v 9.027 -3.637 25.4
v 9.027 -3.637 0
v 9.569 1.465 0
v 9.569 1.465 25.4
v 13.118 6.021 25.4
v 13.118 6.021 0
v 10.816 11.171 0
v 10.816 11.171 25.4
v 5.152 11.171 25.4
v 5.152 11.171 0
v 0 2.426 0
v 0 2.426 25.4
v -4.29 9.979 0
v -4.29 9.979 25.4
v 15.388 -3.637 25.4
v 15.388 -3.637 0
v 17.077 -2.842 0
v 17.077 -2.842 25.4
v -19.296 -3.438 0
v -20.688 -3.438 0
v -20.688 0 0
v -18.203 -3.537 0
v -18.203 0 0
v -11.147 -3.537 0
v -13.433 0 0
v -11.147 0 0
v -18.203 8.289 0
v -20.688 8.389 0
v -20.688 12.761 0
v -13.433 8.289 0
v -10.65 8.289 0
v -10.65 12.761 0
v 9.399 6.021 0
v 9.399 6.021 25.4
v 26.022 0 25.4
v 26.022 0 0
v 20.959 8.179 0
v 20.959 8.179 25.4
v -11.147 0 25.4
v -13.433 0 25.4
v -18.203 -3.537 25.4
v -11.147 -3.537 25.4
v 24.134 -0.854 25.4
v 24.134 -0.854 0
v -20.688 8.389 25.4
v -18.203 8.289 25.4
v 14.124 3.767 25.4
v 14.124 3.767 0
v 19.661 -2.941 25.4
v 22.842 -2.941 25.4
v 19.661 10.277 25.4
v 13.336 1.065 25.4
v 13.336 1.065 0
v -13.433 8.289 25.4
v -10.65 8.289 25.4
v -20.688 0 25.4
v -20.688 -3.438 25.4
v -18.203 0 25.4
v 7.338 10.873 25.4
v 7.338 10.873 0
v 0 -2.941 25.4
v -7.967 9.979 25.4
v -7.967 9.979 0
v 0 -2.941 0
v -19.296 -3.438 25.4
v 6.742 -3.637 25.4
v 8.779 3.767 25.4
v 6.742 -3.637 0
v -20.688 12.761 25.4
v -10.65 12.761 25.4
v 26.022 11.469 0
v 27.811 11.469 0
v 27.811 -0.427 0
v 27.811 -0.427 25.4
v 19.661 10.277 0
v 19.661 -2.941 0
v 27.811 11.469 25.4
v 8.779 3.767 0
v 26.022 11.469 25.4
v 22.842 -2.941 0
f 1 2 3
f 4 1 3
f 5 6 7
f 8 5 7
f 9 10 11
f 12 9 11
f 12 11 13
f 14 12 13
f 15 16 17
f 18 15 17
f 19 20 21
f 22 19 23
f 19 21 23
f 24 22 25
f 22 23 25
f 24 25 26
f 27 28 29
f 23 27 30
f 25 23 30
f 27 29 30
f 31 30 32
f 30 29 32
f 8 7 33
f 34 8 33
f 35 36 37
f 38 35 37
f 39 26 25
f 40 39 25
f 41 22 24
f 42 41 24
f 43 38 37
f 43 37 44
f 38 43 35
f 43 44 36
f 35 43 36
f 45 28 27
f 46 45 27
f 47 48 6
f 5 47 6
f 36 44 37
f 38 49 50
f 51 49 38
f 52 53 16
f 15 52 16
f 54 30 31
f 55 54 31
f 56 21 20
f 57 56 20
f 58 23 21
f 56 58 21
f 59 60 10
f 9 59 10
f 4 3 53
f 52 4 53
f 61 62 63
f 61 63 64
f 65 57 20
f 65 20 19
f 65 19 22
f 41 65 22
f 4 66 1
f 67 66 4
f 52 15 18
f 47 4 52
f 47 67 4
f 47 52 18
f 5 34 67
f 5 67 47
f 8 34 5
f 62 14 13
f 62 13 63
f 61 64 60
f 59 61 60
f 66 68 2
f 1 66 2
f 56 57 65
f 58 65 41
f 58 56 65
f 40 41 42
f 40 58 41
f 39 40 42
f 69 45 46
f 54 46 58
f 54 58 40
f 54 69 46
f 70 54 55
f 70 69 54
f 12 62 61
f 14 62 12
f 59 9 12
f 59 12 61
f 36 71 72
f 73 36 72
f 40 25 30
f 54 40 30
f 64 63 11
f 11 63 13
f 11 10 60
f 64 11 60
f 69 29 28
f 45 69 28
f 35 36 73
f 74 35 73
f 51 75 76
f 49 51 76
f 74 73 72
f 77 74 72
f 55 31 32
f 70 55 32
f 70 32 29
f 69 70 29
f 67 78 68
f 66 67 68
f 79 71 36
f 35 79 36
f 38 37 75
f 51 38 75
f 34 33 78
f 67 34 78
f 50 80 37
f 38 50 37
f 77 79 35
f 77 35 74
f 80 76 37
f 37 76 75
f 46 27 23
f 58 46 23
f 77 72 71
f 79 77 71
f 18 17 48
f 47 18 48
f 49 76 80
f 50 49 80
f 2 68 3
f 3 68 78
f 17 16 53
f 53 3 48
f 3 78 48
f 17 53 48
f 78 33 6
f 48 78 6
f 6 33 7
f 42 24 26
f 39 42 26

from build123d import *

# Parameters (mm, degrees)
F1_DEPTH = 25.4


with BuildPart() as f1:
    # F0 (on Top) → F1 (new body)
    with BuildSketch(Plane.XY):
        Polygon((-4.289746, 9.978659), (-7.966883, 9.978659), (0, -2.941008), (7.337954, 10.873098), (5.151548, 11.171243), (0, 2.425623), align=None)
        Polygon((14.12448, 3.76728), (8.778994, 3.76728), (6.741662, -3.636682), (9.027448, -3.636682), (9.568511, 1.464764), (13.335659, 1.065218), (15.387899, -3.636682), (17.077396, -2.841626), align=None)
        Polygon((-20.687785, 8.388546), (-18.203234, 8.289164), (-18.203234, 0), (-20.687785, 0), (-20.687785, -3.437918), (-19.296436, -3.437918), (-18.203234, -3.5373), (-13.432895, -3.5373), (-11.147108, -3.5373), (-11.147108, 0), (-13.432895, 0), (-13.432895, 8.289164), (-10.650198, 8.289164), (-10.650198, 12.761357), (-13.432895, 12.761357), (-18.203234, 12.761357), (-20.687785, 12.761357), align=None)
        Polygon((26.02178, 11.469389), (26.02178, 0), (27.810657, -0.426992), (27.810657, 11.469389), align=None)
        Polygon((20.959464, 8.179363), (19.66133, 10.276805), (19.66133, -2.941008), (22.841554, -2.941008), align=None)
        Polygon((26.02178, 0), (20.959464, 8.179363), (24.13352, -0.853985), align=None)
        Polygon((13.117711, 6.020525), (10.816326, 11.171243), (9.399015, 6.020525), align=None)
        Polygon((13.117711, 6.020525), (9.399015, 6.020525), (8.778994, 3.76728), (14.12448, 3.76728), align=None)
    extrude(amount=F1_DEPTH)


solid = f1.part
